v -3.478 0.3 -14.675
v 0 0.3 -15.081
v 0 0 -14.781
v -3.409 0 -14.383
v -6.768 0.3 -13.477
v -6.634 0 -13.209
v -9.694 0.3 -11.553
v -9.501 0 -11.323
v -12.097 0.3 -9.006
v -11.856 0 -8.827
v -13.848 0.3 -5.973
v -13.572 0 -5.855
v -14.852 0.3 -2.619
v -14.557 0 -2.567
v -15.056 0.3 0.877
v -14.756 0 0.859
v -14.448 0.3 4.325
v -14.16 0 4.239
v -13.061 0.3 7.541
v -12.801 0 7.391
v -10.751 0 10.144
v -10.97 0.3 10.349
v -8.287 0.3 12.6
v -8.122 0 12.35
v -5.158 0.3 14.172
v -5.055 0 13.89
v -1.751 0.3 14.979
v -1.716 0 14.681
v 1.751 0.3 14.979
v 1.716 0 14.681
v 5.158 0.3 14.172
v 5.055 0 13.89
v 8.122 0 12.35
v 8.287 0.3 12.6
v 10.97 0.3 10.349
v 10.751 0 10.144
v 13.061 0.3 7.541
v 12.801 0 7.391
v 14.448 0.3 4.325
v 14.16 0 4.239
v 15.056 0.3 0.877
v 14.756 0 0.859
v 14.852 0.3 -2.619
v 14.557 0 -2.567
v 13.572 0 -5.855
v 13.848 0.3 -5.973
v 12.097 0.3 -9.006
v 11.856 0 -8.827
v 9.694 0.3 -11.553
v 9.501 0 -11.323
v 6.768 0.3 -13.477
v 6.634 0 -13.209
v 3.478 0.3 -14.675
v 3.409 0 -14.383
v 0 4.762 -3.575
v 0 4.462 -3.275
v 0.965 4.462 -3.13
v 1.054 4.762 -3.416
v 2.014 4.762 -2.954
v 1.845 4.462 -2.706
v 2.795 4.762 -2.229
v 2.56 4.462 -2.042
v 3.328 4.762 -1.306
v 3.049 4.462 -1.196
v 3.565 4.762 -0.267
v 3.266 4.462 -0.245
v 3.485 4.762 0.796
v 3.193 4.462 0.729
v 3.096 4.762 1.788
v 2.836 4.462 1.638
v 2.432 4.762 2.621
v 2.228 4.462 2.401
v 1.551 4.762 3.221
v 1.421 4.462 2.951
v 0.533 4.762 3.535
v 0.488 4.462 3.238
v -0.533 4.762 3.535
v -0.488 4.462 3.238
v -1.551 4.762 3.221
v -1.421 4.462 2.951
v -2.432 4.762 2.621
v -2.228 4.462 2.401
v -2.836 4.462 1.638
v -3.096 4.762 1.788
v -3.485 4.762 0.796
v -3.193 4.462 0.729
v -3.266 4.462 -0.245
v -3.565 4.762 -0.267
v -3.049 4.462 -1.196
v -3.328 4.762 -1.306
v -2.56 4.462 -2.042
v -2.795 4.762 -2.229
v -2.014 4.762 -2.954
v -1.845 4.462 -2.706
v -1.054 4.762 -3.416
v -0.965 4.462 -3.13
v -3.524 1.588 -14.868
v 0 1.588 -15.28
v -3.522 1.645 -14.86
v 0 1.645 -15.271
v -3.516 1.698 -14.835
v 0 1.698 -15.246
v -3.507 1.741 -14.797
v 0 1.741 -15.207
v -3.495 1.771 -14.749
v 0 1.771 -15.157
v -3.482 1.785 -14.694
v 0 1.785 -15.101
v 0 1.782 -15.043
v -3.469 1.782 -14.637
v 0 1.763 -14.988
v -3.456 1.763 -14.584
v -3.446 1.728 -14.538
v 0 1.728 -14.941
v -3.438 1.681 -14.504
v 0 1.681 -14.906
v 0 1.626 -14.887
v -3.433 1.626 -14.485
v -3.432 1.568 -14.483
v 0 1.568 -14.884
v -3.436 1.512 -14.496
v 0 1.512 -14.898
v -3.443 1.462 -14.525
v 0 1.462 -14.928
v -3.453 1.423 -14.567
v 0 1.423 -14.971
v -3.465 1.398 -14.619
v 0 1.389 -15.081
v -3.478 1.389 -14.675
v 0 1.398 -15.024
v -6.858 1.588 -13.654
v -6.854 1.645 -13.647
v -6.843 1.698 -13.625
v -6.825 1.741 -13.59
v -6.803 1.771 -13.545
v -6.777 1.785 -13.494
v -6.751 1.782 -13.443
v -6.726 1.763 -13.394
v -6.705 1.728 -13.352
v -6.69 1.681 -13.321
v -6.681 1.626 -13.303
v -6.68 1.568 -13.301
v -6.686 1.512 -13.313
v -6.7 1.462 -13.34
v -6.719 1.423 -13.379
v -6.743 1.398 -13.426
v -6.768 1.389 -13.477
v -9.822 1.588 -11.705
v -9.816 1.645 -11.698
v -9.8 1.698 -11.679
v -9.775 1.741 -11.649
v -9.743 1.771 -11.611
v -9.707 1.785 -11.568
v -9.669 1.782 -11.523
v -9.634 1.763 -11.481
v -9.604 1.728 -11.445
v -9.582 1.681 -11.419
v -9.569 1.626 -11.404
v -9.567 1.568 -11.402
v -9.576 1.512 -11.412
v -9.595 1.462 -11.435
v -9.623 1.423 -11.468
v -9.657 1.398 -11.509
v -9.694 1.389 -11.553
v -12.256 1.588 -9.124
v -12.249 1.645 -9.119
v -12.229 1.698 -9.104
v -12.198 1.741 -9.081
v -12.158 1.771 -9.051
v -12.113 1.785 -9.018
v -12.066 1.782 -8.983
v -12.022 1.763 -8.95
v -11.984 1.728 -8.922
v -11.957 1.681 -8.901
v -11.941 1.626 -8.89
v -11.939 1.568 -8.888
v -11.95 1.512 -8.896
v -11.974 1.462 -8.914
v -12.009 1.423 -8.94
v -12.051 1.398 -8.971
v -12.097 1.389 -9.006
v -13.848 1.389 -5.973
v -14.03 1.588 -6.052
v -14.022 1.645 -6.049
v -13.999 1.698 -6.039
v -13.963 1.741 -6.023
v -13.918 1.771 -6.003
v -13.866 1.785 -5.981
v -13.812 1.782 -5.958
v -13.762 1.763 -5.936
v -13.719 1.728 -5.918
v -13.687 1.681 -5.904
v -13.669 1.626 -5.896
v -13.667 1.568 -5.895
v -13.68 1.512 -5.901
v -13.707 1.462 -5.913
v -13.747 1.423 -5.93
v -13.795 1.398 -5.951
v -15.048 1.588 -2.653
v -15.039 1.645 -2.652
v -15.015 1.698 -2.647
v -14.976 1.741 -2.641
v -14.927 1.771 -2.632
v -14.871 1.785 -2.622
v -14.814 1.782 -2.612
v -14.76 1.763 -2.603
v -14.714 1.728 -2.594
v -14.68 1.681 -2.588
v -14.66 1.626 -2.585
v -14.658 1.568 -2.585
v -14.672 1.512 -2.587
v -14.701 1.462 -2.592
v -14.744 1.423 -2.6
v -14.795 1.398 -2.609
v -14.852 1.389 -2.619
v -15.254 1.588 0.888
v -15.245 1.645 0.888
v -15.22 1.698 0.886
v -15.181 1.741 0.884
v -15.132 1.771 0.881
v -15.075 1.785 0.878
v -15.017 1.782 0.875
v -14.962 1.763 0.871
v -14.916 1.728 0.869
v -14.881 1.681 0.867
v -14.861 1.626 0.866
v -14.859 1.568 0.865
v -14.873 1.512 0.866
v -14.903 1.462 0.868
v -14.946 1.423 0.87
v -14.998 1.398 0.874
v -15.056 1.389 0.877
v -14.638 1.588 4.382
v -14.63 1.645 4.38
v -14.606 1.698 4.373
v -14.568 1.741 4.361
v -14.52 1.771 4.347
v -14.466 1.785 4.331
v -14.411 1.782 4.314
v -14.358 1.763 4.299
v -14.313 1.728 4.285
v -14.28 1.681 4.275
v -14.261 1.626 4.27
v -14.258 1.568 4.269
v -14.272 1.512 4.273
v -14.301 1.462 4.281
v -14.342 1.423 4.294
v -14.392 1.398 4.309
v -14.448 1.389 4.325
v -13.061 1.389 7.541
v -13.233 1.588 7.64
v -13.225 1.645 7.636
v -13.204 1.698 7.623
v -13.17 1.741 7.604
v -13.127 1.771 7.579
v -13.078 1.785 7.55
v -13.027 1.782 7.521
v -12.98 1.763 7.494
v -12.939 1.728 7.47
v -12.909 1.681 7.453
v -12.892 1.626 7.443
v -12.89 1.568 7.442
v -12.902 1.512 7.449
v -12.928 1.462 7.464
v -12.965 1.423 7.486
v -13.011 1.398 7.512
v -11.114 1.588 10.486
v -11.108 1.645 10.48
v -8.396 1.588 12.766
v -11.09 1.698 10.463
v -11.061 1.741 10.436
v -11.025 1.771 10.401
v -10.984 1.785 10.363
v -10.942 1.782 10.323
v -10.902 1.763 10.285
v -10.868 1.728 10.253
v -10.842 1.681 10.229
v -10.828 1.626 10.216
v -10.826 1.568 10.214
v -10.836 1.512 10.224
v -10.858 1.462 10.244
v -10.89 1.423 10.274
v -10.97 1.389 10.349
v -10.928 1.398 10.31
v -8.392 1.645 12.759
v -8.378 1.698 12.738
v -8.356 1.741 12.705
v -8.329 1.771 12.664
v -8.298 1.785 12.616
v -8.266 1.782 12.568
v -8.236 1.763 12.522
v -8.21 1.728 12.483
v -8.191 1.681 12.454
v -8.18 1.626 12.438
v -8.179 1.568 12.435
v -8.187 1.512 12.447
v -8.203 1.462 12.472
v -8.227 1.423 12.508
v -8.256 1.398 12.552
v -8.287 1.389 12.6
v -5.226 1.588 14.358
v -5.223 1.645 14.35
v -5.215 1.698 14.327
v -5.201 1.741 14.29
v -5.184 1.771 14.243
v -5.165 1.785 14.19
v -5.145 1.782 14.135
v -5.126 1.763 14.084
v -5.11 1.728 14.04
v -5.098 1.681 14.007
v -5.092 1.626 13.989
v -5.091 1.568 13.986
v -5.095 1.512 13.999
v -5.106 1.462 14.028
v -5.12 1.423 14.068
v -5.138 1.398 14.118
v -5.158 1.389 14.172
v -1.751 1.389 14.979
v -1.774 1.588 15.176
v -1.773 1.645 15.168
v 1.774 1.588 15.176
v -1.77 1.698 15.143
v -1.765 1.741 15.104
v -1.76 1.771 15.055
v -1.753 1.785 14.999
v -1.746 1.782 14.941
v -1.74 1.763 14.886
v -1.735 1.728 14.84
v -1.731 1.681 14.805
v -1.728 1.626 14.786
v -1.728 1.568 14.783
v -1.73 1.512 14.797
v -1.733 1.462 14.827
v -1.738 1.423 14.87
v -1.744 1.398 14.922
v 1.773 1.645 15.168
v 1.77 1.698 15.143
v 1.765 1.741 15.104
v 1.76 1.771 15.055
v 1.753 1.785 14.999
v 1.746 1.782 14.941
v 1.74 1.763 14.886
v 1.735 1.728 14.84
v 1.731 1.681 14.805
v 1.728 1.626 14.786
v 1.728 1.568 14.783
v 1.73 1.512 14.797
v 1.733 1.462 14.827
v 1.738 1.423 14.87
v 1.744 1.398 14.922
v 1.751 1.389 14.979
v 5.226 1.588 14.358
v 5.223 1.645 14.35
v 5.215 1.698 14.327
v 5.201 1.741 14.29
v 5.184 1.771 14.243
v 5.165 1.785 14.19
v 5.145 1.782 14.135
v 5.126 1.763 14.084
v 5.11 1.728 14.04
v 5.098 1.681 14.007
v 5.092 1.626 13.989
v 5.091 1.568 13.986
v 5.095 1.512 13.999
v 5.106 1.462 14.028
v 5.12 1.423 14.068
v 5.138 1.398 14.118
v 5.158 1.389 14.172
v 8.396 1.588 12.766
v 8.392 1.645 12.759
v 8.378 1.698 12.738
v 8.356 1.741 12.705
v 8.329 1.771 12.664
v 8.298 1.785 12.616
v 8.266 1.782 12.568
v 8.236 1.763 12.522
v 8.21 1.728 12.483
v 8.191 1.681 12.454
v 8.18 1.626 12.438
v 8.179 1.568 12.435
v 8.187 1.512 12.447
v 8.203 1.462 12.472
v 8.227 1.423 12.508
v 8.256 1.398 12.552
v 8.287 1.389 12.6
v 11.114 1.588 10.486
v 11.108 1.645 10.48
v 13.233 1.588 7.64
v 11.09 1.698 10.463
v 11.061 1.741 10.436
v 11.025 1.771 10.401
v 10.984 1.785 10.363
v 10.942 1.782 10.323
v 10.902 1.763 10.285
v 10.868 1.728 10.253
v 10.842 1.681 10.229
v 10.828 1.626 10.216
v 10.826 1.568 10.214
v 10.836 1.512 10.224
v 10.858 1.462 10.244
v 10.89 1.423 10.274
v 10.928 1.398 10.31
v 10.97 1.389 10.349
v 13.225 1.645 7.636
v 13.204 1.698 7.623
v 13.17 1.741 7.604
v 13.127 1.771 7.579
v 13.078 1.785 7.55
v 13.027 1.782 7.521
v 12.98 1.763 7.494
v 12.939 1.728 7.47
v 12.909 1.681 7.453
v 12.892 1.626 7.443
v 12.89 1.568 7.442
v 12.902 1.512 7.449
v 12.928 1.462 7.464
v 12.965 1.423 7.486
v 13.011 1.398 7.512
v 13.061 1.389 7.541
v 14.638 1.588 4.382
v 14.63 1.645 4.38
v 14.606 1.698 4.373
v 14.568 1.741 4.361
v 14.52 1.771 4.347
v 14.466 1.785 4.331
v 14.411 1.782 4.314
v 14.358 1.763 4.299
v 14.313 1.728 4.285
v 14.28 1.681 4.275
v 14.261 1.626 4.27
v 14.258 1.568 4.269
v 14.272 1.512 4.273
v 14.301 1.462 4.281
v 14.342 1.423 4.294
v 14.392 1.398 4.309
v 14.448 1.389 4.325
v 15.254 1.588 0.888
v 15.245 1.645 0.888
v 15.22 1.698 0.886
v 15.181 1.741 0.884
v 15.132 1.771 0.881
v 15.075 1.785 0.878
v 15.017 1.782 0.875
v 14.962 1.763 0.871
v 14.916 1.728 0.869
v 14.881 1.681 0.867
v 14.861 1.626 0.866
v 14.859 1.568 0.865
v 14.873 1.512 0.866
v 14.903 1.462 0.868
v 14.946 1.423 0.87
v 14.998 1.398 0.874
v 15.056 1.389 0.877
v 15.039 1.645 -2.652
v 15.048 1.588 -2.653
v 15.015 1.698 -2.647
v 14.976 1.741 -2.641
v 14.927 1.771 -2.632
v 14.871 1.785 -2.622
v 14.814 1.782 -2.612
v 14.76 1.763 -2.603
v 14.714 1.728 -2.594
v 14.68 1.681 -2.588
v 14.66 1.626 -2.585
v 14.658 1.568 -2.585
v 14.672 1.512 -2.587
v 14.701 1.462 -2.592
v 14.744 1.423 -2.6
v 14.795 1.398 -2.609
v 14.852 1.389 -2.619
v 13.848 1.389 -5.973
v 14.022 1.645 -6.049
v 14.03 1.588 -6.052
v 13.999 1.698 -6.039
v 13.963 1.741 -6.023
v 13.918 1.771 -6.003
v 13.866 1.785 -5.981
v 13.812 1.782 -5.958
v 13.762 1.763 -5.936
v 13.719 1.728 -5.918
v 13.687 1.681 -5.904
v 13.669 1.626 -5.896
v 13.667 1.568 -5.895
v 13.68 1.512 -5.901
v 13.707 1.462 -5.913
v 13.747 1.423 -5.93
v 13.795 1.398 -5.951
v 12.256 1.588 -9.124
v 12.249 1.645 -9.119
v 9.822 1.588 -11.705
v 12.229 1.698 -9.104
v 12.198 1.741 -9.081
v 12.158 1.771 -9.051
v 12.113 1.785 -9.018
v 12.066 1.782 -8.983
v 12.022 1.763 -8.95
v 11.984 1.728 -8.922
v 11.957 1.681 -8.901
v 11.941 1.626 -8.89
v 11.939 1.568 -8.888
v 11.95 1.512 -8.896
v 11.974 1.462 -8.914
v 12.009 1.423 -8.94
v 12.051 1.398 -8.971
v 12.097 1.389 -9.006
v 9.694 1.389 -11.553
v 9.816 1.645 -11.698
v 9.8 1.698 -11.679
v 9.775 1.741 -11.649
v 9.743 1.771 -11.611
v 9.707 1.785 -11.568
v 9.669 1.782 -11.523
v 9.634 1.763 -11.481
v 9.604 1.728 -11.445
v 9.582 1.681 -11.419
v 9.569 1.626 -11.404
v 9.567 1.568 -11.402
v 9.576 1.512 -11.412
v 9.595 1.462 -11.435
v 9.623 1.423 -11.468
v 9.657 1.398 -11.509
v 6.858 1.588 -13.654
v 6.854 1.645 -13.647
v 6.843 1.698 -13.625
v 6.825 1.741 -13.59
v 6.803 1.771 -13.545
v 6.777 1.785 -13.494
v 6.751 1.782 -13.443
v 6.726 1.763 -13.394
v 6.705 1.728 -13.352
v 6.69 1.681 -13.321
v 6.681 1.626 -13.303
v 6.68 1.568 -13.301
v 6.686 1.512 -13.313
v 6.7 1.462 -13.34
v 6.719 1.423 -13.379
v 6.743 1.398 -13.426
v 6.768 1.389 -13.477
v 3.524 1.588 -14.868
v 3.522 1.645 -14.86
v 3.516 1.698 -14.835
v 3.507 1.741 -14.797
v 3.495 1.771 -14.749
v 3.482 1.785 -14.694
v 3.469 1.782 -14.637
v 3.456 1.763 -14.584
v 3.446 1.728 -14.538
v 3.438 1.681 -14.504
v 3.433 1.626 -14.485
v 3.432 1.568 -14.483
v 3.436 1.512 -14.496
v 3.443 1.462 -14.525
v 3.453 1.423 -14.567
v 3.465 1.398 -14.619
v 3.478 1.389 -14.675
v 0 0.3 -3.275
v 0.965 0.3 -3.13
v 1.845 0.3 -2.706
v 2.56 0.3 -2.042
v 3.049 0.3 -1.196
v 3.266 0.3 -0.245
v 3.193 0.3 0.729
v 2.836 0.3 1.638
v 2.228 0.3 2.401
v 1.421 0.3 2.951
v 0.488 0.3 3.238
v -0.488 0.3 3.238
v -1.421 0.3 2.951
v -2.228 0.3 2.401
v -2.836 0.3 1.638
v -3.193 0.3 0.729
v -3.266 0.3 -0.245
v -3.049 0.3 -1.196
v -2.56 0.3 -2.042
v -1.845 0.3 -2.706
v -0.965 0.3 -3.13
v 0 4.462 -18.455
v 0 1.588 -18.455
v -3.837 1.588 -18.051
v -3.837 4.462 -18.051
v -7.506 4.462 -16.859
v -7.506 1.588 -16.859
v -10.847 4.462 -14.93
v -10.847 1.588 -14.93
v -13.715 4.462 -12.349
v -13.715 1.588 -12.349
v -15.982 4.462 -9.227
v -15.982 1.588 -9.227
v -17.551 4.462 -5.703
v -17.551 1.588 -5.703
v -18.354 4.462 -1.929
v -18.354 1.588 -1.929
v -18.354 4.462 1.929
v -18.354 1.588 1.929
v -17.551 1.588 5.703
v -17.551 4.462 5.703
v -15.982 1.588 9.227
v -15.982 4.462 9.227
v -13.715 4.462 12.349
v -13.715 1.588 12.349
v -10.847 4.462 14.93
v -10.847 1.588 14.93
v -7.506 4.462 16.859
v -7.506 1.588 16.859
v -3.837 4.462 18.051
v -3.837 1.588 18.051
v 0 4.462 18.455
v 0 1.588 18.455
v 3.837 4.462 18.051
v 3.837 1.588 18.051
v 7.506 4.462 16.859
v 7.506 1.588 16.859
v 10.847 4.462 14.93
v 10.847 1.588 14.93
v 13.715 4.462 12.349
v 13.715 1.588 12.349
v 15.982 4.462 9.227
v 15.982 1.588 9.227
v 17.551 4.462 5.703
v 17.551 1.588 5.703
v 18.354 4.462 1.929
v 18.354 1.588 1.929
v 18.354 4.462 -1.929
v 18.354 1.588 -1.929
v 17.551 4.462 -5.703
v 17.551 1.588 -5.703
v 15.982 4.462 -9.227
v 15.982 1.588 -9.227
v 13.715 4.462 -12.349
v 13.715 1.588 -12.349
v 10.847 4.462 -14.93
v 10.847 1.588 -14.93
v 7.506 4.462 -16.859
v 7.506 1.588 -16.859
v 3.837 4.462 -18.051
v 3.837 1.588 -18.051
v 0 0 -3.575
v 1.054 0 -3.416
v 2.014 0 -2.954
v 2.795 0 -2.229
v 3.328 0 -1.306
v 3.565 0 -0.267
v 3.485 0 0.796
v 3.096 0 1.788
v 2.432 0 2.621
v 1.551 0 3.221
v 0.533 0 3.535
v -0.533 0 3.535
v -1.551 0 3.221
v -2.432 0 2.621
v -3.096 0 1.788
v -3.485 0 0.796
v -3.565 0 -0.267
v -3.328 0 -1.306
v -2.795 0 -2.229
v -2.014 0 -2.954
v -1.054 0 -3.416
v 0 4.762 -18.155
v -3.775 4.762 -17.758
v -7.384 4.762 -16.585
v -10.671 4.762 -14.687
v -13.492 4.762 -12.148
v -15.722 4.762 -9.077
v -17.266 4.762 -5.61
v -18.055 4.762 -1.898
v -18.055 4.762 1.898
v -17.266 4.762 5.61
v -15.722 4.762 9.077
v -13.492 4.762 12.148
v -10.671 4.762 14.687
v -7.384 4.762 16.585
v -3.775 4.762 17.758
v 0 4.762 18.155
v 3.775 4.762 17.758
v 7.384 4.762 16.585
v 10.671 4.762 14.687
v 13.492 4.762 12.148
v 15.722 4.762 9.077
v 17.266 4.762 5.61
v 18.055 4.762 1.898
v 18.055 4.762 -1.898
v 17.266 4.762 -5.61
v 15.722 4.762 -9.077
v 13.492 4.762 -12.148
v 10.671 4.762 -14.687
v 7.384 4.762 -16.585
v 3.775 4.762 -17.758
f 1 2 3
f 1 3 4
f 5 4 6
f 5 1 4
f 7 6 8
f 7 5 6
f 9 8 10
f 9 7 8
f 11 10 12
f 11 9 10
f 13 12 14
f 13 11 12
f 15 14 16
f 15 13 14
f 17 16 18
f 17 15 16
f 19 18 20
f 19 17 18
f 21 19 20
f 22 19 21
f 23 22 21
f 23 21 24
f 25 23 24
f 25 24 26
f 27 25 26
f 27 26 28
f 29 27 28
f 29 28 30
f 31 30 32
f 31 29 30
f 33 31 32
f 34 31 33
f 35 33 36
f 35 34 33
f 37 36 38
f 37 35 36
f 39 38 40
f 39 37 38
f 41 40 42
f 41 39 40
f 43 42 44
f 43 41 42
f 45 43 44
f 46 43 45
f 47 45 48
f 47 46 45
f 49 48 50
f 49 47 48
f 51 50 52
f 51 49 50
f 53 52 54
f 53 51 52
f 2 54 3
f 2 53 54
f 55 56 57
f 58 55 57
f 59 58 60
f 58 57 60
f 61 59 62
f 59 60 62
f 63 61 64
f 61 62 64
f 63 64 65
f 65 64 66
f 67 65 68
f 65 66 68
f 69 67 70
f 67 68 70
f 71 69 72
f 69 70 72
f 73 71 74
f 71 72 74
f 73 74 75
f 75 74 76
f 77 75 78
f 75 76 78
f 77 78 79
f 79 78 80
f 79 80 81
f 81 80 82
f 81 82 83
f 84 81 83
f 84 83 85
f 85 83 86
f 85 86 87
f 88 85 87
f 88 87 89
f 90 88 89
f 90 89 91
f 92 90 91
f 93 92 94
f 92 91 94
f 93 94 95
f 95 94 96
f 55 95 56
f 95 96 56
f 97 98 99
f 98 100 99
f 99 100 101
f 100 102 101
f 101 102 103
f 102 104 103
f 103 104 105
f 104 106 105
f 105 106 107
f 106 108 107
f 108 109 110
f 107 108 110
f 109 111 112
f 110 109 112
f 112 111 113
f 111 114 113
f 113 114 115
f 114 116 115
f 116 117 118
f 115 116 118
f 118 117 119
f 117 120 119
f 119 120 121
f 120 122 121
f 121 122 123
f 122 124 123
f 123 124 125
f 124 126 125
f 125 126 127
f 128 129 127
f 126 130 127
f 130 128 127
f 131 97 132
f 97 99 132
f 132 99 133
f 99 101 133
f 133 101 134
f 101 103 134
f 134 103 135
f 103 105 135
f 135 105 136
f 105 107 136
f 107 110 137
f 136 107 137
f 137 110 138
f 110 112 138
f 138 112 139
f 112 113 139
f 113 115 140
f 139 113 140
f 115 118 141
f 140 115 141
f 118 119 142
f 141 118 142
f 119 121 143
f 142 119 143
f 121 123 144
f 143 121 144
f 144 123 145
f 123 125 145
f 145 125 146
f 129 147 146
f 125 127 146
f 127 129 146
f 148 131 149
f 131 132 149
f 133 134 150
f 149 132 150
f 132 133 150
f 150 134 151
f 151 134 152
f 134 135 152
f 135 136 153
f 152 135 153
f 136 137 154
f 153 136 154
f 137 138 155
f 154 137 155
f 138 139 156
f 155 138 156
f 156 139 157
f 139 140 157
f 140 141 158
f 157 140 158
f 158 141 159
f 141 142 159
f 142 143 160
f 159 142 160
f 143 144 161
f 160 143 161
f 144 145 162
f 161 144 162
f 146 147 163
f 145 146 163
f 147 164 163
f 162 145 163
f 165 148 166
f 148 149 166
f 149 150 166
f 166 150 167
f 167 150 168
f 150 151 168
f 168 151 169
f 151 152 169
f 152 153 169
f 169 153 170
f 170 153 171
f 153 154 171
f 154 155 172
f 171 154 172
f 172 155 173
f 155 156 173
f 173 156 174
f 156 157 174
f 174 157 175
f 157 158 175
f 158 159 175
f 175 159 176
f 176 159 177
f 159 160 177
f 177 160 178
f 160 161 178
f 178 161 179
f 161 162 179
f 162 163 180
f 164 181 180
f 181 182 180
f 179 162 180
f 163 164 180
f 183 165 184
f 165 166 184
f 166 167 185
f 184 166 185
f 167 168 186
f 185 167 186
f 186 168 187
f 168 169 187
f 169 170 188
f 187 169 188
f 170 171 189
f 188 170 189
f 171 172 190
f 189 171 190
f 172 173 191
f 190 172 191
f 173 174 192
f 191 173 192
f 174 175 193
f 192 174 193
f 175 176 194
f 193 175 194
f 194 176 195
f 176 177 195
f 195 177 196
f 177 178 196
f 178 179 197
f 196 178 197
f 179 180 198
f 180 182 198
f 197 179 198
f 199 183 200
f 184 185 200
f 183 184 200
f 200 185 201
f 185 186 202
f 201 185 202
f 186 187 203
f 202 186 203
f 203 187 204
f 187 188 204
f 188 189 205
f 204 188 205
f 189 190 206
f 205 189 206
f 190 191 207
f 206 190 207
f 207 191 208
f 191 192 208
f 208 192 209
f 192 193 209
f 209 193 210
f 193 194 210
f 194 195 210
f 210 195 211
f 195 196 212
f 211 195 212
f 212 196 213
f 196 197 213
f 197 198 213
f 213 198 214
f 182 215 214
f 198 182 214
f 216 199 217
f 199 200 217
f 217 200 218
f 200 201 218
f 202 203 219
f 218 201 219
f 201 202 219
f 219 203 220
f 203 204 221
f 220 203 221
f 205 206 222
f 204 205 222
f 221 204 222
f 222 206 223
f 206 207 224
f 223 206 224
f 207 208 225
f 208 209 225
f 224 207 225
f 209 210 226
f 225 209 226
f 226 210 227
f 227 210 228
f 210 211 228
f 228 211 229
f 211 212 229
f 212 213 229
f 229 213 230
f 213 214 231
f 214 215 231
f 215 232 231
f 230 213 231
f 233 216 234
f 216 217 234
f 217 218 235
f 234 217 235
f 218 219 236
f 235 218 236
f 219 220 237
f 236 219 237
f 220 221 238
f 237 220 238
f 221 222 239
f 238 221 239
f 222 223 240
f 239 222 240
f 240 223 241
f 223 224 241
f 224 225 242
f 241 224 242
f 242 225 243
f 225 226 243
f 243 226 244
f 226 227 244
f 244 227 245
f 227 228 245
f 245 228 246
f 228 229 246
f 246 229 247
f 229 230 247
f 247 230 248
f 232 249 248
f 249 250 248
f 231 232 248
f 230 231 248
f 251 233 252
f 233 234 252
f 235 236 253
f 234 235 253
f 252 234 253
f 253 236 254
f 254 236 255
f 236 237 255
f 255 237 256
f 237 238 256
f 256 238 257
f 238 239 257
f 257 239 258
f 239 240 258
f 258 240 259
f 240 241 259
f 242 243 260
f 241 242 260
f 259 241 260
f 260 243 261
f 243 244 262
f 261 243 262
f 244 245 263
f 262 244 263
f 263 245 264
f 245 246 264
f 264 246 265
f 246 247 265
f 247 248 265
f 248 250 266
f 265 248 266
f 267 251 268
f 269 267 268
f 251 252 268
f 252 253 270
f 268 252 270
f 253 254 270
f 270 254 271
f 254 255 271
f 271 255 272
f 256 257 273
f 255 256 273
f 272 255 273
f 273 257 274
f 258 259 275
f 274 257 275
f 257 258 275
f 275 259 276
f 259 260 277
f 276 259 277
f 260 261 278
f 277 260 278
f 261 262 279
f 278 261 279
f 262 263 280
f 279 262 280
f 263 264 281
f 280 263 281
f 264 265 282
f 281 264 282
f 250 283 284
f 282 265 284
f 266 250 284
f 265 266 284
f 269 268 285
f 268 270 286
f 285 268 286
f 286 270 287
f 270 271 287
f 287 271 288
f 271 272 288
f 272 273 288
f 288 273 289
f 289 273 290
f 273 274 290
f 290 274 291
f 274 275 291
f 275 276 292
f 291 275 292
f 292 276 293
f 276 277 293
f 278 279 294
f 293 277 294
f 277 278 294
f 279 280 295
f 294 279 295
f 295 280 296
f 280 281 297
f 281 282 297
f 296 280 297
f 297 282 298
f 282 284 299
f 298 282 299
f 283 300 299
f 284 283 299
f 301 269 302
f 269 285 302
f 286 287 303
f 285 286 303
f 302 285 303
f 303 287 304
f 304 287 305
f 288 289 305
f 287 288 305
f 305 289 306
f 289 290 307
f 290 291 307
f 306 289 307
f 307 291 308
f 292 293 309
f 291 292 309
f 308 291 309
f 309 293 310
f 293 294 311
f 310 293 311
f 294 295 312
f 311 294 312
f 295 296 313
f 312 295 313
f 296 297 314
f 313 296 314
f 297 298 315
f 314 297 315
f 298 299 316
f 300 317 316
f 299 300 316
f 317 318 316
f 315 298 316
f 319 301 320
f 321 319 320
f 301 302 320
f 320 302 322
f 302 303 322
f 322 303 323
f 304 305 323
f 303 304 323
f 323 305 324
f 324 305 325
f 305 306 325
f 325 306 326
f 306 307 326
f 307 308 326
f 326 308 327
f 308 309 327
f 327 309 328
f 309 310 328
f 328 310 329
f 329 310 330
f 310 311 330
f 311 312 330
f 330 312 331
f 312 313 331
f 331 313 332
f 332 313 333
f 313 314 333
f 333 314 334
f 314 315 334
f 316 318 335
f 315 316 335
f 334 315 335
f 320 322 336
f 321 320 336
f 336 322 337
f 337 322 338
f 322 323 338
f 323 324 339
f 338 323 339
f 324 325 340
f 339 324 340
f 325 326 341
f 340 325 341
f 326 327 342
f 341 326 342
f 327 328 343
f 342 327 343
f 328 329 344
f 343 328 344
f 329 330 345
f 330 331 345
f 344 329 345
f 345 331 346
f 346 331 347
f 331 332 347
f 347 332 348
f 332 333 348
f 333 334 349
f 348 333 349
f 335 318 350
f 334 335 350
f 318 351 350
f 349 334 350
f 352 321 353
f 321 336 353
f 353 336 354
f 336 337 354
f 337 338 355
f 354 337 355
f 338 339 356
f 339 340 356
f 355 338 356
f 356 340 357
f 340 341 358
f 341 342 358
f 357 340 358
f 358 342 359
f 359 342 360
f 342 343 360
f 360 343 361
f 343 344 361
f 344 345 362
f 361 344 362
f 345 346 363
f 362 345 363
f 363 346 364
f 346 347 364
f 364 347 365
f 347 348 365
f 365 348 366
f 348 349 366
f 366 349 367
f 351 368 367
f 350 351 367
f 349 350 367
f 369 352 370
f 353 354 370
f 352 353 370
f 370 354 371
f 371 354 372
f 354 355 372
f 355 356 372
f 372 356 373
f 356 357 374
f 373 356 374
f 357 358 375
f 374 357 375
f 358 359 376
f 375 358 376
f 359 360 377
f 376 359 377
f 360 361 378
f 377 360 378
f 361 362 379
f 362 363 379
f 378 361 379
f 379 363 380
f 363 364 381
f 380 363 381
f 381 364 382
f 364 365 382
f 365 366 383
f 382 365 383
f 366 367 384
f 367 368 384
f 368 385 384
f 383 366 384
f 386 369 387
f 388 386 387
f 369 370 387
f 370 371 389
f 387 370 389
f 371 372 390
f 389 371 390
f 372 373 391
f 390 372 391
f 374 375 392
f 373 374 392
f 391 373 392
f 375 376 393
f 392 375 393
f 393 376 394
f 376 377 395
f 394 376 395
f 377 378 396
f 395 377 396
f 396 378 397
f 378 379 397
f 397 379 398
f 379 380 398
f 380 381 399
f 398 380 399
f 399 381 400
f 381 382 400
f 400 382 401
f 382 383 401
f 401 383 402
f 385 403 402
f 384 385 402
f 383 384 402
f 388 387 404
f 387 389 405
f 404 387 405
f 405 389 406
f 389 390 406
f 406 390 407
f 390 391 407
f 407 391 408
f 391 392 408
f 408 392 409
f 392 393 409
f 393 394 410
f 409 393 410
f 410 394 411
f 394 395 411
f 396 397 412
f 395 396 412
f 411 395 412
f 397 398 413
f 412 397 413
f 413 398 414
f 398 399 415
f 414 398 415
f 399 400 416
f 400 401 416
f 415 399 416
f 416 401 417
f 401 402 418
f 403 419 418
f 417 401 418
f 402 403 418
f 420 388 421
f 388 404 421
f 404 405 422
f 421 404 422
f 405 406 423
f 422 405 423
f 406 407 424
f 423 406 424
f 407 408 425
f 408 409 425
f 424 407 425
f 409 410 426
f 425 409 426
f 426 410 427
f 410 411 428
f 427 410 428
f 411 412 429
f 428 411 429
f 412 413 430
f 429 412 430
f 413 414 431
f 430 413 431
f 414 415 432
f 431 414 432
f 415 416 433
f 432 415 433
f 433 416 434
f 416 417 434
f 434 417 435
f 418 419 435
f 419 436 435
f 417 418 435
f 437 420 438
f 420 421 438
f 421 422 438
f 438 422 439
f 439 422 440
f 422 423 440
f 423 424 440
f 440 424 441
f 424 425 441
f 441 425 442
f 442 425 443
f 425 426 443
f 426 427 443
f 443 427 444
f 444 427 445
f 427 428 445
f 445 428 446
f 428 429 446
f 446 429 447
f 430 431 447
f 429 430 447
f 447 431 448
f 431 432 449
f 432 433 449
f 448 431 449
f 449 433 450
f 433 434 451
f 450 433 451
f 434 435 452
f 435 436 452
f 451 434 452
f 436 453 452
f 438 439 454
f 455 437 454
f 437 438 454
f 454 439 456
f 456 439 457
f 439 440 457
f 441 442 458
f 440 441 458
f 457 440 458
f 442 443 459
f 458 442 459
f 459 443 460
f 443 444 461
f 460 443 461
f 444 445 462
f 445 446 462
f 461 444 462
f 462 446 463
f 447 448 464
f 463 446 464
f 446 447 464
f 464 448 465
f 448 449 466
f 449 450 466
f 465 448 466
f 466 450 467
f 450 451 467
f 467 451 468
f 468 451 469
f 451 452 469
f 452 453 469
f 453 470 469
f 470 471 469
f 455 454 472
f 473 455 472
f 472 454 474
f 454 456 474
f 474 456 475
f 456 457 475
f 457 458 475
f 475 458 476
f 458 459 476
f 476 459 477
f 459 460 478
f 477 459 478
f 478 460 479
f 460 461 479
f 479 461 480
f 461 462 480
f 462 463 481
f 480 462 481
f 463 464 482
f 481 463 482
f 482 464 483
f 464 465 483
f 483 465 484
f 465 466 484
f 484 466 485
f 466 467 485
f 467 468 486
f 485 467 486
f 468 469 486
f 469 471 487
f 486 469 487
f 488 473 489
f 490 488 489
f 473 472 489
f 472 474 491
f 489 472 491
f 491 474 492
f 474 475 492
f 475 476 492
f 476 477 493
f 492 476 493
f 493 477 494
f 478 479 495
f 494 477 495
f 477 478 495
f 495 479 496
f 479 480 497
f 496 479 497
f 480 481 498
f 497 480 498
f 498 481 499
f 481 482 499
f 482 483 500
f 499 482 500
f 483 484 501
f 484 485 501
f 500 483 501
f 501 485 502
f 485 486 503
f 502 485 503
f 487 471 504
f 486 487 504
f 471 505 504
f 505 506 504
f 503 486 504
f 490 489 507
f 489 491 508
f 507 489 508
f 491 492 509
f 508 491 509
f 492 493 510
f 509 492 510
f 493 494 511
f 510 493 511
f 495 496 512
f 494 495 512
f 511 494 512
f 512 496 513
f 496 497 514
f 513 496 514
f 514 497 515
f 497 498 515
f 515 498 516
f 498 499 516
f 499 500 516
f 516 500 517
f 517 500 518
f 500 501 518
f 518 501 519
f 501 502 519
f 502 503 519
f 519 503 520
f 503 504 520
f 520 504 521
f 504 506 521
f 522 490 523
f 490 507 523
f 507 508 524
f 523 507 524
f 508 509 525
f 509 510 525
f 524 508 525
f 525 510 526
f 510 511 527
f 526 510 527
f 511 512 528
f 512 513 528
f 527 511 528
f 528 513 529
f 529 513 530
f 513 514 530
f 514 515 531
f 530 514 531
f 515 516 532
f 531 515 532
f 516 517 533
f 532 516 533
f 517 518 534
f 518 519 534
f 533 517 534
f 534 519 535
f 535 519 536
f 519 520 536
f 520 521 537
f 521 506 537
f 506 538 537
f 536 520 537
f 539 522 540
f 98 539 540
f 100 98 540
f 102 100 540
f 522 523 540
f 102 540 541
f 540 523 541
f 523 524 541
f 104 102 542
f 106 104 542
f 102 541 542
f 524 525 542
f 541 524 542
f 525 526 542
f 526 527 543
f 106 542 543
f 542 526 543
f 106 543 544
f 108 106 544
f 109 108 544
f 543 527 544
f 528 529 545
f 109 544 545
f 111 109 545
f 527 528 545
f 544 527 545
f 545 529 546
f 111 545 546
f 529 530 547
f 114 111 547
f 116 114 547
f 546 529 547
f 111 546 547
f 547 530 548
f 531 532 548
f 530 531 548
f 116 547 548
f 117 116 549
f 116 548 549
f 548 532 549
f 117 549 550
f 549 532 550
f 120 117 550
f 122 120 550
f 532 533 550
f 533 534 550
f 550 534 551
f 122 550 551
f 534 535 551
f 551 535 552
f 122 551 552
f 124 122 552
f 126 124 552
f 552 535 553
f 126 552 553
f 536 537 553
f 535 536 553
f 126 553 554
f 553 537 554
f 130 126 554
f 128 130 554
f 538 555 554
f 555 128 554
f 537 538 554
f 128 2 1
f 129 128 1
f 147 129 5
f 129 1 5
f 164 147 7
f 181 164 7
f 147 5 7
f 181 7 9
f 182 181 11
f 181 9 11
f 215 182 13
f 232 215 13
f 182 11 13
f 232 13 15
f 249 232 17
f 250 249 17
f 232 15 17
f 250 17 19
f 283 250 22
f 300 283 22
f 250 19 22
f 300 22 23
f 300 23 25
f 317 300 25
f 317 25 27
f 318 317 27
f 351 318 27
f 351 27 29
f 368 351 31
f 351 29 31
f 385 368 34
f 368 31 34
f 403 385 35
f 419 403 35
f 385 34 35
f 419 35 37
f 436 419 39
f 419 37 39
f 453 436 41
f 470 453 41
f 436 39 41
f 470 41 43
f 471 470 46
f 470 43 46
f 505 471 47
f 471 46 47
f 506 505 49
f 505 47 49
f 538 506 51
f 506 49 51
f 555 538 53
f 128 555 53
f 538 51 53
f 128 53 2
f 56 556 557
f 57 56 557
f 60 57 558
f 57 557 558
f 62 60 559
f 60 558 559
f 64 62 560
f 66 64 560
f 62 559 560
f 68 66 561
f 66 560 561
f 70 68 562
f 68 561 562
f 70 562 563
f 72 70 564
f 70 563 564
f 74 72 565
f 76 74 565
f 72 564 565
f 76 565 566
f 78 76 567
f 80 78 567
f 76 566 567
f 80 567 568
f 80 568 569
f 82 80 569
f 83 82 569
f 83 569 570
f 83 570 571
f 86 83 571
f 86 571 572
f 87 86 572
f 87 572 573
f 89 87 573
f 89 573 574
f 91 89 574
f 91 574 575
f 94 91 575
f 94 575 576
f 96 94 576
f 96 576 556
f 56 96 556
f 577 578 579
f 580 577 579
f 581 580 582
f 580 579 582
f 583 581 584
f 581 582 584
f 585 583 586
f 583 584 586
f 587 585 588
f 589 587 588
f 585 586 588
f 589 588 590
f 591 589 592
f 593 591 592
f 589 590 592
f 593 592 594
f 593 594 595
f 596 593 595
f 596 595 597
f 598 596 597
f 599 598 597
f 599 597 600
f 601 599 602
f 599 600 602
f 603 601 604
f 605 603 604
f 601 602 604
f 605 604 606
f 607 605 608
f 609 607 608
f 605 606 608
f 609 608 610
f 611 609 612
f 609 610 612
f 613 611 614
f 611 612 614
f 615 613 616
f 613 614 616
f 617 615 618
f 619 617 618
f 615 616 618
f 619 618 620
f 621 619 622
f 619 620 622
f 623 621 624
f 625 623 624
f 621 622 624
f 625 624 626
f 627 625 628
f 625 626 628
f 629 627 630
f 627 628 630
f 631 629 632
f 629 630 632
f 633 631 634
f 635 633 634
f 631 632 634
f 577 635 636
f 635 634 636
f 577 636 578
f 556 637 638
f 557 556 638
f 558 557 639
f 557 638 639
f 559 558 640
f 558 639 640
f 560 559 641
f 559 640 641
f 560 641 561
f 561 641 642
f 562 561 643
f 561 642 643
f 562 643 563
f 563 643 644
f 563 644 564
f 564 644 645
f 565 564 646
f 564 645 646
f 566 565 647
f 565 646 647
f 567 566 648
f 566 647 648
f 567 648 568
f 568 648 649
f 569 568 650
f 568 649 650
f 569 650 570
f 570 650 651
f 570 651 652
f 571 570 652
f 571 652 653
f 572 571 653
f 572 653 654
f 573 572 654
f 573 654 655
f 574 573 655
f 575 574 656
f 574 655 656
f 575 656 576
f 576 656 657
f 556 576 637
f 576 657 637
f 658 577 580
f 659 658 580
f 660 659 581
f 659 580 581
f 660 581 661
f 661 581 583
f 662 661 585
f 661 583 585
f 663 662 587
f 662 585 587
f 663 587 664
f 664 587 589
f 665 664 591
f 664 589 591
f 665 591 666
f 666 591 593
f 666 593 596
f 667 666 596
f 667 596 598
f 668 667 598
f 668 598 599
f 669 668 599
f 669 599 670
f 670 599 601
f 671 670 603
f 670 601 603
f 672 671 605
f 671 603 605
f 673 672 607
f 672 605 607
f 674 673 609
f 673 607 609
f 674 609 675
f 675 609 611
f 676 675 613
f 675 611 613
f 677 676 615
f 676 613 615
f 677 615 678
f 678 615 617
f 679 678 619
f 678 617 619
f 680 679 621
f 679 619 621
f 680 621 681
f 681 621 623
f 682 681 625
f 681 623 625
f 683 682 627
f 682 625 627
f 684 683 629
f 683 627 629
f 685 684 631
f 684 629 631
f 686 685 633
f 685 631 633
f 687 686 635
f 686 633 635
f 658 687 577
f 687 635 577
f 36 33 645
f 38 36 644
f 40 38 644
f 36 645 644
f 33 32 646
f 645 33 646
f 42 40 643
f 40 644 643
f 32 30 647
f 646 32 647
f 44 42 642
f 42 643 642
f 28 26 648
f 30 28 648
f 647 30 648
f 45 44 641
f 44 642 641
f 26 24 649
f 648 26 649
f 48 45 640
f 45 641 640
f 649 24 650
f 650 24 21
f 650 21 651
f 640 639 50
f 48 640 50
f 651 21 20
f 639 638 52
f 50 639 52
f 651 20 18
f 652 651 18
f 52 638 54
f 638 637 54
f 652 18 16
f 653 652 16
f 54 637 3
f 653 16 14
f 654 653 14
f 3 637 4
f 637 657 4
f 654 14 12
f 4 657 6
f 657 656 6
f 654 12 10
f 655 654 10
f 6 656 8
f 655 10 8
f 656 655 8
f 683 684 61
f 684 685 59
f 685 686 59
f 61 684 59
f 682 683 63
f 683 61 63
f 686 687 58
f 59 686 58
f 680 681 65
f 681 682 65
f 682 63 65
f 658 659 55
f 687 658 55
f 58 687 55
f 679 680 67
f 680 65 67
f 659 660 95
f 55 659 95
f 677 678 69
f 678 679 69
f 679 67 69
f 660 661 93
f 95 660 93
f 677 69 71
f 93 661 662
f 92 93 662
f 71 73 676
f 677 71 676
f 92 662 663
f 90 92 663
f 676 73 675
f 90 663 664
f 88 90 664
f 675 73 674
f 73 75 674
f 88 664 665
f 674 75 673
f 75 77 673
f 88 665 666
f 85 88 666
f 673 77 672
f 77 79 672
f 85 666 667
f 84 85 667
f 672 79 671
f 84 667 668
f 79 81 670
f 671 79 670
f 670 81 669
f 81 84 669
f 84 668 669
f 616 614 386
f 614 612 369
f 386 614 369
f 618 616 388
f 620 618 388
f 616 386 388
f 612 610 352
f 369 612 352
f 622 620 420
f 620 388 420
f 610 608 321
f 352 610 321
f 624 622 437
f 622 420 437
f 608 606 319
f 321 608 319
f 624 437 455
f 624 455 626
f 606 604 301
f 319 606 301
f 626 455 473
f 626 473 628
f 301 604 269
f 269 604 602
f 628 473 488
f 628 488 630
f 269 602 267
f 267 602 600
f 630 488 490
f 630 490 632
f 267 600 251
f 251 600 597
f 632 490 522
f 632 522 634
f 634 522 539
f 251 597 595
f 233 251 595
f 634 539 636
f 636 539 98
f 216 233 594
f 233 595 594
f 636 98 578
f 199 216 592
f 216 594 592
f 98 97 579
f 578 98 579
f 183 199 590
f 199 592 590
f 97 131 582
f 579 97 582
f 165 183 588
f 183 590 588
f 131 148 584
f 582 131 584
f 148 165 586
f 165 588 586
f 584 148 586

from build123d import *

# Parameters (mm, degrees)
SKETCH3_R          = 3.275
CUT_EXTRUDE1_DEPTH = 27.529839572
CHAMFER1_SIZE      = 0.3


with BuildPart() as part:
    # Sketch2 → Revolve1 (revolve)
    with BuildSketch(Plane.XY, mode=Mode.PRIVATE) as revolve1_sk:
        with BuildLine():
            Line((0, 0), (0, 4.7625))
            Line((0, 4.7625), (18.4546875, 4.7625))
            Line((18.4546875, 4.7625), (18.4546875, 1.5875))
            Line((18.4546875, 1.5875), (15.2796875, 1.5875))
            ThreePointArc((15.2796875, 1.5875), (14.940933498, 1.727816502), (15.08125, 1.3890625))
            Line((15.08125, 1.3890625), (15.08125, 0))
            Line((15.08125, 0), (0, 0))
        make_face()
    revolve(revolve1_sk.sketch.rotate(Axis((0, 0, 0), (0, 1, 0)), 90), axis=Axis((0, 0, 0), (0, 1, 0)))

    # Sketch3 → Cut-Extrude1 (cut, through all)
    with BuildSketch(Plane(origin=(0, 0, 0), x_dir=(-1, 0, 0), z_dir=(0, -1, 0))):
        with Locations(Location((0, 0, 0), (0, 0, 90))):
            Circle(SKETCH3_R)
    extrude(amount=-CUT_EXTRUDE1_DEPTH, mode=Mode.SUBTRACT)

    # Chamfer1
    chamfer1_edges = [part.edges().sort_by_distance(p)[0] for p in [
        (0, 4.7625, 3.275),
        (0, 0, 3.275),
        (0, 4.7625, 18.4546875),
        (0, 0, 15.08125),
    ]]
    chamfer(chamfer1_edges, length=CHAMFER1_SIZE)


solid = part.part
